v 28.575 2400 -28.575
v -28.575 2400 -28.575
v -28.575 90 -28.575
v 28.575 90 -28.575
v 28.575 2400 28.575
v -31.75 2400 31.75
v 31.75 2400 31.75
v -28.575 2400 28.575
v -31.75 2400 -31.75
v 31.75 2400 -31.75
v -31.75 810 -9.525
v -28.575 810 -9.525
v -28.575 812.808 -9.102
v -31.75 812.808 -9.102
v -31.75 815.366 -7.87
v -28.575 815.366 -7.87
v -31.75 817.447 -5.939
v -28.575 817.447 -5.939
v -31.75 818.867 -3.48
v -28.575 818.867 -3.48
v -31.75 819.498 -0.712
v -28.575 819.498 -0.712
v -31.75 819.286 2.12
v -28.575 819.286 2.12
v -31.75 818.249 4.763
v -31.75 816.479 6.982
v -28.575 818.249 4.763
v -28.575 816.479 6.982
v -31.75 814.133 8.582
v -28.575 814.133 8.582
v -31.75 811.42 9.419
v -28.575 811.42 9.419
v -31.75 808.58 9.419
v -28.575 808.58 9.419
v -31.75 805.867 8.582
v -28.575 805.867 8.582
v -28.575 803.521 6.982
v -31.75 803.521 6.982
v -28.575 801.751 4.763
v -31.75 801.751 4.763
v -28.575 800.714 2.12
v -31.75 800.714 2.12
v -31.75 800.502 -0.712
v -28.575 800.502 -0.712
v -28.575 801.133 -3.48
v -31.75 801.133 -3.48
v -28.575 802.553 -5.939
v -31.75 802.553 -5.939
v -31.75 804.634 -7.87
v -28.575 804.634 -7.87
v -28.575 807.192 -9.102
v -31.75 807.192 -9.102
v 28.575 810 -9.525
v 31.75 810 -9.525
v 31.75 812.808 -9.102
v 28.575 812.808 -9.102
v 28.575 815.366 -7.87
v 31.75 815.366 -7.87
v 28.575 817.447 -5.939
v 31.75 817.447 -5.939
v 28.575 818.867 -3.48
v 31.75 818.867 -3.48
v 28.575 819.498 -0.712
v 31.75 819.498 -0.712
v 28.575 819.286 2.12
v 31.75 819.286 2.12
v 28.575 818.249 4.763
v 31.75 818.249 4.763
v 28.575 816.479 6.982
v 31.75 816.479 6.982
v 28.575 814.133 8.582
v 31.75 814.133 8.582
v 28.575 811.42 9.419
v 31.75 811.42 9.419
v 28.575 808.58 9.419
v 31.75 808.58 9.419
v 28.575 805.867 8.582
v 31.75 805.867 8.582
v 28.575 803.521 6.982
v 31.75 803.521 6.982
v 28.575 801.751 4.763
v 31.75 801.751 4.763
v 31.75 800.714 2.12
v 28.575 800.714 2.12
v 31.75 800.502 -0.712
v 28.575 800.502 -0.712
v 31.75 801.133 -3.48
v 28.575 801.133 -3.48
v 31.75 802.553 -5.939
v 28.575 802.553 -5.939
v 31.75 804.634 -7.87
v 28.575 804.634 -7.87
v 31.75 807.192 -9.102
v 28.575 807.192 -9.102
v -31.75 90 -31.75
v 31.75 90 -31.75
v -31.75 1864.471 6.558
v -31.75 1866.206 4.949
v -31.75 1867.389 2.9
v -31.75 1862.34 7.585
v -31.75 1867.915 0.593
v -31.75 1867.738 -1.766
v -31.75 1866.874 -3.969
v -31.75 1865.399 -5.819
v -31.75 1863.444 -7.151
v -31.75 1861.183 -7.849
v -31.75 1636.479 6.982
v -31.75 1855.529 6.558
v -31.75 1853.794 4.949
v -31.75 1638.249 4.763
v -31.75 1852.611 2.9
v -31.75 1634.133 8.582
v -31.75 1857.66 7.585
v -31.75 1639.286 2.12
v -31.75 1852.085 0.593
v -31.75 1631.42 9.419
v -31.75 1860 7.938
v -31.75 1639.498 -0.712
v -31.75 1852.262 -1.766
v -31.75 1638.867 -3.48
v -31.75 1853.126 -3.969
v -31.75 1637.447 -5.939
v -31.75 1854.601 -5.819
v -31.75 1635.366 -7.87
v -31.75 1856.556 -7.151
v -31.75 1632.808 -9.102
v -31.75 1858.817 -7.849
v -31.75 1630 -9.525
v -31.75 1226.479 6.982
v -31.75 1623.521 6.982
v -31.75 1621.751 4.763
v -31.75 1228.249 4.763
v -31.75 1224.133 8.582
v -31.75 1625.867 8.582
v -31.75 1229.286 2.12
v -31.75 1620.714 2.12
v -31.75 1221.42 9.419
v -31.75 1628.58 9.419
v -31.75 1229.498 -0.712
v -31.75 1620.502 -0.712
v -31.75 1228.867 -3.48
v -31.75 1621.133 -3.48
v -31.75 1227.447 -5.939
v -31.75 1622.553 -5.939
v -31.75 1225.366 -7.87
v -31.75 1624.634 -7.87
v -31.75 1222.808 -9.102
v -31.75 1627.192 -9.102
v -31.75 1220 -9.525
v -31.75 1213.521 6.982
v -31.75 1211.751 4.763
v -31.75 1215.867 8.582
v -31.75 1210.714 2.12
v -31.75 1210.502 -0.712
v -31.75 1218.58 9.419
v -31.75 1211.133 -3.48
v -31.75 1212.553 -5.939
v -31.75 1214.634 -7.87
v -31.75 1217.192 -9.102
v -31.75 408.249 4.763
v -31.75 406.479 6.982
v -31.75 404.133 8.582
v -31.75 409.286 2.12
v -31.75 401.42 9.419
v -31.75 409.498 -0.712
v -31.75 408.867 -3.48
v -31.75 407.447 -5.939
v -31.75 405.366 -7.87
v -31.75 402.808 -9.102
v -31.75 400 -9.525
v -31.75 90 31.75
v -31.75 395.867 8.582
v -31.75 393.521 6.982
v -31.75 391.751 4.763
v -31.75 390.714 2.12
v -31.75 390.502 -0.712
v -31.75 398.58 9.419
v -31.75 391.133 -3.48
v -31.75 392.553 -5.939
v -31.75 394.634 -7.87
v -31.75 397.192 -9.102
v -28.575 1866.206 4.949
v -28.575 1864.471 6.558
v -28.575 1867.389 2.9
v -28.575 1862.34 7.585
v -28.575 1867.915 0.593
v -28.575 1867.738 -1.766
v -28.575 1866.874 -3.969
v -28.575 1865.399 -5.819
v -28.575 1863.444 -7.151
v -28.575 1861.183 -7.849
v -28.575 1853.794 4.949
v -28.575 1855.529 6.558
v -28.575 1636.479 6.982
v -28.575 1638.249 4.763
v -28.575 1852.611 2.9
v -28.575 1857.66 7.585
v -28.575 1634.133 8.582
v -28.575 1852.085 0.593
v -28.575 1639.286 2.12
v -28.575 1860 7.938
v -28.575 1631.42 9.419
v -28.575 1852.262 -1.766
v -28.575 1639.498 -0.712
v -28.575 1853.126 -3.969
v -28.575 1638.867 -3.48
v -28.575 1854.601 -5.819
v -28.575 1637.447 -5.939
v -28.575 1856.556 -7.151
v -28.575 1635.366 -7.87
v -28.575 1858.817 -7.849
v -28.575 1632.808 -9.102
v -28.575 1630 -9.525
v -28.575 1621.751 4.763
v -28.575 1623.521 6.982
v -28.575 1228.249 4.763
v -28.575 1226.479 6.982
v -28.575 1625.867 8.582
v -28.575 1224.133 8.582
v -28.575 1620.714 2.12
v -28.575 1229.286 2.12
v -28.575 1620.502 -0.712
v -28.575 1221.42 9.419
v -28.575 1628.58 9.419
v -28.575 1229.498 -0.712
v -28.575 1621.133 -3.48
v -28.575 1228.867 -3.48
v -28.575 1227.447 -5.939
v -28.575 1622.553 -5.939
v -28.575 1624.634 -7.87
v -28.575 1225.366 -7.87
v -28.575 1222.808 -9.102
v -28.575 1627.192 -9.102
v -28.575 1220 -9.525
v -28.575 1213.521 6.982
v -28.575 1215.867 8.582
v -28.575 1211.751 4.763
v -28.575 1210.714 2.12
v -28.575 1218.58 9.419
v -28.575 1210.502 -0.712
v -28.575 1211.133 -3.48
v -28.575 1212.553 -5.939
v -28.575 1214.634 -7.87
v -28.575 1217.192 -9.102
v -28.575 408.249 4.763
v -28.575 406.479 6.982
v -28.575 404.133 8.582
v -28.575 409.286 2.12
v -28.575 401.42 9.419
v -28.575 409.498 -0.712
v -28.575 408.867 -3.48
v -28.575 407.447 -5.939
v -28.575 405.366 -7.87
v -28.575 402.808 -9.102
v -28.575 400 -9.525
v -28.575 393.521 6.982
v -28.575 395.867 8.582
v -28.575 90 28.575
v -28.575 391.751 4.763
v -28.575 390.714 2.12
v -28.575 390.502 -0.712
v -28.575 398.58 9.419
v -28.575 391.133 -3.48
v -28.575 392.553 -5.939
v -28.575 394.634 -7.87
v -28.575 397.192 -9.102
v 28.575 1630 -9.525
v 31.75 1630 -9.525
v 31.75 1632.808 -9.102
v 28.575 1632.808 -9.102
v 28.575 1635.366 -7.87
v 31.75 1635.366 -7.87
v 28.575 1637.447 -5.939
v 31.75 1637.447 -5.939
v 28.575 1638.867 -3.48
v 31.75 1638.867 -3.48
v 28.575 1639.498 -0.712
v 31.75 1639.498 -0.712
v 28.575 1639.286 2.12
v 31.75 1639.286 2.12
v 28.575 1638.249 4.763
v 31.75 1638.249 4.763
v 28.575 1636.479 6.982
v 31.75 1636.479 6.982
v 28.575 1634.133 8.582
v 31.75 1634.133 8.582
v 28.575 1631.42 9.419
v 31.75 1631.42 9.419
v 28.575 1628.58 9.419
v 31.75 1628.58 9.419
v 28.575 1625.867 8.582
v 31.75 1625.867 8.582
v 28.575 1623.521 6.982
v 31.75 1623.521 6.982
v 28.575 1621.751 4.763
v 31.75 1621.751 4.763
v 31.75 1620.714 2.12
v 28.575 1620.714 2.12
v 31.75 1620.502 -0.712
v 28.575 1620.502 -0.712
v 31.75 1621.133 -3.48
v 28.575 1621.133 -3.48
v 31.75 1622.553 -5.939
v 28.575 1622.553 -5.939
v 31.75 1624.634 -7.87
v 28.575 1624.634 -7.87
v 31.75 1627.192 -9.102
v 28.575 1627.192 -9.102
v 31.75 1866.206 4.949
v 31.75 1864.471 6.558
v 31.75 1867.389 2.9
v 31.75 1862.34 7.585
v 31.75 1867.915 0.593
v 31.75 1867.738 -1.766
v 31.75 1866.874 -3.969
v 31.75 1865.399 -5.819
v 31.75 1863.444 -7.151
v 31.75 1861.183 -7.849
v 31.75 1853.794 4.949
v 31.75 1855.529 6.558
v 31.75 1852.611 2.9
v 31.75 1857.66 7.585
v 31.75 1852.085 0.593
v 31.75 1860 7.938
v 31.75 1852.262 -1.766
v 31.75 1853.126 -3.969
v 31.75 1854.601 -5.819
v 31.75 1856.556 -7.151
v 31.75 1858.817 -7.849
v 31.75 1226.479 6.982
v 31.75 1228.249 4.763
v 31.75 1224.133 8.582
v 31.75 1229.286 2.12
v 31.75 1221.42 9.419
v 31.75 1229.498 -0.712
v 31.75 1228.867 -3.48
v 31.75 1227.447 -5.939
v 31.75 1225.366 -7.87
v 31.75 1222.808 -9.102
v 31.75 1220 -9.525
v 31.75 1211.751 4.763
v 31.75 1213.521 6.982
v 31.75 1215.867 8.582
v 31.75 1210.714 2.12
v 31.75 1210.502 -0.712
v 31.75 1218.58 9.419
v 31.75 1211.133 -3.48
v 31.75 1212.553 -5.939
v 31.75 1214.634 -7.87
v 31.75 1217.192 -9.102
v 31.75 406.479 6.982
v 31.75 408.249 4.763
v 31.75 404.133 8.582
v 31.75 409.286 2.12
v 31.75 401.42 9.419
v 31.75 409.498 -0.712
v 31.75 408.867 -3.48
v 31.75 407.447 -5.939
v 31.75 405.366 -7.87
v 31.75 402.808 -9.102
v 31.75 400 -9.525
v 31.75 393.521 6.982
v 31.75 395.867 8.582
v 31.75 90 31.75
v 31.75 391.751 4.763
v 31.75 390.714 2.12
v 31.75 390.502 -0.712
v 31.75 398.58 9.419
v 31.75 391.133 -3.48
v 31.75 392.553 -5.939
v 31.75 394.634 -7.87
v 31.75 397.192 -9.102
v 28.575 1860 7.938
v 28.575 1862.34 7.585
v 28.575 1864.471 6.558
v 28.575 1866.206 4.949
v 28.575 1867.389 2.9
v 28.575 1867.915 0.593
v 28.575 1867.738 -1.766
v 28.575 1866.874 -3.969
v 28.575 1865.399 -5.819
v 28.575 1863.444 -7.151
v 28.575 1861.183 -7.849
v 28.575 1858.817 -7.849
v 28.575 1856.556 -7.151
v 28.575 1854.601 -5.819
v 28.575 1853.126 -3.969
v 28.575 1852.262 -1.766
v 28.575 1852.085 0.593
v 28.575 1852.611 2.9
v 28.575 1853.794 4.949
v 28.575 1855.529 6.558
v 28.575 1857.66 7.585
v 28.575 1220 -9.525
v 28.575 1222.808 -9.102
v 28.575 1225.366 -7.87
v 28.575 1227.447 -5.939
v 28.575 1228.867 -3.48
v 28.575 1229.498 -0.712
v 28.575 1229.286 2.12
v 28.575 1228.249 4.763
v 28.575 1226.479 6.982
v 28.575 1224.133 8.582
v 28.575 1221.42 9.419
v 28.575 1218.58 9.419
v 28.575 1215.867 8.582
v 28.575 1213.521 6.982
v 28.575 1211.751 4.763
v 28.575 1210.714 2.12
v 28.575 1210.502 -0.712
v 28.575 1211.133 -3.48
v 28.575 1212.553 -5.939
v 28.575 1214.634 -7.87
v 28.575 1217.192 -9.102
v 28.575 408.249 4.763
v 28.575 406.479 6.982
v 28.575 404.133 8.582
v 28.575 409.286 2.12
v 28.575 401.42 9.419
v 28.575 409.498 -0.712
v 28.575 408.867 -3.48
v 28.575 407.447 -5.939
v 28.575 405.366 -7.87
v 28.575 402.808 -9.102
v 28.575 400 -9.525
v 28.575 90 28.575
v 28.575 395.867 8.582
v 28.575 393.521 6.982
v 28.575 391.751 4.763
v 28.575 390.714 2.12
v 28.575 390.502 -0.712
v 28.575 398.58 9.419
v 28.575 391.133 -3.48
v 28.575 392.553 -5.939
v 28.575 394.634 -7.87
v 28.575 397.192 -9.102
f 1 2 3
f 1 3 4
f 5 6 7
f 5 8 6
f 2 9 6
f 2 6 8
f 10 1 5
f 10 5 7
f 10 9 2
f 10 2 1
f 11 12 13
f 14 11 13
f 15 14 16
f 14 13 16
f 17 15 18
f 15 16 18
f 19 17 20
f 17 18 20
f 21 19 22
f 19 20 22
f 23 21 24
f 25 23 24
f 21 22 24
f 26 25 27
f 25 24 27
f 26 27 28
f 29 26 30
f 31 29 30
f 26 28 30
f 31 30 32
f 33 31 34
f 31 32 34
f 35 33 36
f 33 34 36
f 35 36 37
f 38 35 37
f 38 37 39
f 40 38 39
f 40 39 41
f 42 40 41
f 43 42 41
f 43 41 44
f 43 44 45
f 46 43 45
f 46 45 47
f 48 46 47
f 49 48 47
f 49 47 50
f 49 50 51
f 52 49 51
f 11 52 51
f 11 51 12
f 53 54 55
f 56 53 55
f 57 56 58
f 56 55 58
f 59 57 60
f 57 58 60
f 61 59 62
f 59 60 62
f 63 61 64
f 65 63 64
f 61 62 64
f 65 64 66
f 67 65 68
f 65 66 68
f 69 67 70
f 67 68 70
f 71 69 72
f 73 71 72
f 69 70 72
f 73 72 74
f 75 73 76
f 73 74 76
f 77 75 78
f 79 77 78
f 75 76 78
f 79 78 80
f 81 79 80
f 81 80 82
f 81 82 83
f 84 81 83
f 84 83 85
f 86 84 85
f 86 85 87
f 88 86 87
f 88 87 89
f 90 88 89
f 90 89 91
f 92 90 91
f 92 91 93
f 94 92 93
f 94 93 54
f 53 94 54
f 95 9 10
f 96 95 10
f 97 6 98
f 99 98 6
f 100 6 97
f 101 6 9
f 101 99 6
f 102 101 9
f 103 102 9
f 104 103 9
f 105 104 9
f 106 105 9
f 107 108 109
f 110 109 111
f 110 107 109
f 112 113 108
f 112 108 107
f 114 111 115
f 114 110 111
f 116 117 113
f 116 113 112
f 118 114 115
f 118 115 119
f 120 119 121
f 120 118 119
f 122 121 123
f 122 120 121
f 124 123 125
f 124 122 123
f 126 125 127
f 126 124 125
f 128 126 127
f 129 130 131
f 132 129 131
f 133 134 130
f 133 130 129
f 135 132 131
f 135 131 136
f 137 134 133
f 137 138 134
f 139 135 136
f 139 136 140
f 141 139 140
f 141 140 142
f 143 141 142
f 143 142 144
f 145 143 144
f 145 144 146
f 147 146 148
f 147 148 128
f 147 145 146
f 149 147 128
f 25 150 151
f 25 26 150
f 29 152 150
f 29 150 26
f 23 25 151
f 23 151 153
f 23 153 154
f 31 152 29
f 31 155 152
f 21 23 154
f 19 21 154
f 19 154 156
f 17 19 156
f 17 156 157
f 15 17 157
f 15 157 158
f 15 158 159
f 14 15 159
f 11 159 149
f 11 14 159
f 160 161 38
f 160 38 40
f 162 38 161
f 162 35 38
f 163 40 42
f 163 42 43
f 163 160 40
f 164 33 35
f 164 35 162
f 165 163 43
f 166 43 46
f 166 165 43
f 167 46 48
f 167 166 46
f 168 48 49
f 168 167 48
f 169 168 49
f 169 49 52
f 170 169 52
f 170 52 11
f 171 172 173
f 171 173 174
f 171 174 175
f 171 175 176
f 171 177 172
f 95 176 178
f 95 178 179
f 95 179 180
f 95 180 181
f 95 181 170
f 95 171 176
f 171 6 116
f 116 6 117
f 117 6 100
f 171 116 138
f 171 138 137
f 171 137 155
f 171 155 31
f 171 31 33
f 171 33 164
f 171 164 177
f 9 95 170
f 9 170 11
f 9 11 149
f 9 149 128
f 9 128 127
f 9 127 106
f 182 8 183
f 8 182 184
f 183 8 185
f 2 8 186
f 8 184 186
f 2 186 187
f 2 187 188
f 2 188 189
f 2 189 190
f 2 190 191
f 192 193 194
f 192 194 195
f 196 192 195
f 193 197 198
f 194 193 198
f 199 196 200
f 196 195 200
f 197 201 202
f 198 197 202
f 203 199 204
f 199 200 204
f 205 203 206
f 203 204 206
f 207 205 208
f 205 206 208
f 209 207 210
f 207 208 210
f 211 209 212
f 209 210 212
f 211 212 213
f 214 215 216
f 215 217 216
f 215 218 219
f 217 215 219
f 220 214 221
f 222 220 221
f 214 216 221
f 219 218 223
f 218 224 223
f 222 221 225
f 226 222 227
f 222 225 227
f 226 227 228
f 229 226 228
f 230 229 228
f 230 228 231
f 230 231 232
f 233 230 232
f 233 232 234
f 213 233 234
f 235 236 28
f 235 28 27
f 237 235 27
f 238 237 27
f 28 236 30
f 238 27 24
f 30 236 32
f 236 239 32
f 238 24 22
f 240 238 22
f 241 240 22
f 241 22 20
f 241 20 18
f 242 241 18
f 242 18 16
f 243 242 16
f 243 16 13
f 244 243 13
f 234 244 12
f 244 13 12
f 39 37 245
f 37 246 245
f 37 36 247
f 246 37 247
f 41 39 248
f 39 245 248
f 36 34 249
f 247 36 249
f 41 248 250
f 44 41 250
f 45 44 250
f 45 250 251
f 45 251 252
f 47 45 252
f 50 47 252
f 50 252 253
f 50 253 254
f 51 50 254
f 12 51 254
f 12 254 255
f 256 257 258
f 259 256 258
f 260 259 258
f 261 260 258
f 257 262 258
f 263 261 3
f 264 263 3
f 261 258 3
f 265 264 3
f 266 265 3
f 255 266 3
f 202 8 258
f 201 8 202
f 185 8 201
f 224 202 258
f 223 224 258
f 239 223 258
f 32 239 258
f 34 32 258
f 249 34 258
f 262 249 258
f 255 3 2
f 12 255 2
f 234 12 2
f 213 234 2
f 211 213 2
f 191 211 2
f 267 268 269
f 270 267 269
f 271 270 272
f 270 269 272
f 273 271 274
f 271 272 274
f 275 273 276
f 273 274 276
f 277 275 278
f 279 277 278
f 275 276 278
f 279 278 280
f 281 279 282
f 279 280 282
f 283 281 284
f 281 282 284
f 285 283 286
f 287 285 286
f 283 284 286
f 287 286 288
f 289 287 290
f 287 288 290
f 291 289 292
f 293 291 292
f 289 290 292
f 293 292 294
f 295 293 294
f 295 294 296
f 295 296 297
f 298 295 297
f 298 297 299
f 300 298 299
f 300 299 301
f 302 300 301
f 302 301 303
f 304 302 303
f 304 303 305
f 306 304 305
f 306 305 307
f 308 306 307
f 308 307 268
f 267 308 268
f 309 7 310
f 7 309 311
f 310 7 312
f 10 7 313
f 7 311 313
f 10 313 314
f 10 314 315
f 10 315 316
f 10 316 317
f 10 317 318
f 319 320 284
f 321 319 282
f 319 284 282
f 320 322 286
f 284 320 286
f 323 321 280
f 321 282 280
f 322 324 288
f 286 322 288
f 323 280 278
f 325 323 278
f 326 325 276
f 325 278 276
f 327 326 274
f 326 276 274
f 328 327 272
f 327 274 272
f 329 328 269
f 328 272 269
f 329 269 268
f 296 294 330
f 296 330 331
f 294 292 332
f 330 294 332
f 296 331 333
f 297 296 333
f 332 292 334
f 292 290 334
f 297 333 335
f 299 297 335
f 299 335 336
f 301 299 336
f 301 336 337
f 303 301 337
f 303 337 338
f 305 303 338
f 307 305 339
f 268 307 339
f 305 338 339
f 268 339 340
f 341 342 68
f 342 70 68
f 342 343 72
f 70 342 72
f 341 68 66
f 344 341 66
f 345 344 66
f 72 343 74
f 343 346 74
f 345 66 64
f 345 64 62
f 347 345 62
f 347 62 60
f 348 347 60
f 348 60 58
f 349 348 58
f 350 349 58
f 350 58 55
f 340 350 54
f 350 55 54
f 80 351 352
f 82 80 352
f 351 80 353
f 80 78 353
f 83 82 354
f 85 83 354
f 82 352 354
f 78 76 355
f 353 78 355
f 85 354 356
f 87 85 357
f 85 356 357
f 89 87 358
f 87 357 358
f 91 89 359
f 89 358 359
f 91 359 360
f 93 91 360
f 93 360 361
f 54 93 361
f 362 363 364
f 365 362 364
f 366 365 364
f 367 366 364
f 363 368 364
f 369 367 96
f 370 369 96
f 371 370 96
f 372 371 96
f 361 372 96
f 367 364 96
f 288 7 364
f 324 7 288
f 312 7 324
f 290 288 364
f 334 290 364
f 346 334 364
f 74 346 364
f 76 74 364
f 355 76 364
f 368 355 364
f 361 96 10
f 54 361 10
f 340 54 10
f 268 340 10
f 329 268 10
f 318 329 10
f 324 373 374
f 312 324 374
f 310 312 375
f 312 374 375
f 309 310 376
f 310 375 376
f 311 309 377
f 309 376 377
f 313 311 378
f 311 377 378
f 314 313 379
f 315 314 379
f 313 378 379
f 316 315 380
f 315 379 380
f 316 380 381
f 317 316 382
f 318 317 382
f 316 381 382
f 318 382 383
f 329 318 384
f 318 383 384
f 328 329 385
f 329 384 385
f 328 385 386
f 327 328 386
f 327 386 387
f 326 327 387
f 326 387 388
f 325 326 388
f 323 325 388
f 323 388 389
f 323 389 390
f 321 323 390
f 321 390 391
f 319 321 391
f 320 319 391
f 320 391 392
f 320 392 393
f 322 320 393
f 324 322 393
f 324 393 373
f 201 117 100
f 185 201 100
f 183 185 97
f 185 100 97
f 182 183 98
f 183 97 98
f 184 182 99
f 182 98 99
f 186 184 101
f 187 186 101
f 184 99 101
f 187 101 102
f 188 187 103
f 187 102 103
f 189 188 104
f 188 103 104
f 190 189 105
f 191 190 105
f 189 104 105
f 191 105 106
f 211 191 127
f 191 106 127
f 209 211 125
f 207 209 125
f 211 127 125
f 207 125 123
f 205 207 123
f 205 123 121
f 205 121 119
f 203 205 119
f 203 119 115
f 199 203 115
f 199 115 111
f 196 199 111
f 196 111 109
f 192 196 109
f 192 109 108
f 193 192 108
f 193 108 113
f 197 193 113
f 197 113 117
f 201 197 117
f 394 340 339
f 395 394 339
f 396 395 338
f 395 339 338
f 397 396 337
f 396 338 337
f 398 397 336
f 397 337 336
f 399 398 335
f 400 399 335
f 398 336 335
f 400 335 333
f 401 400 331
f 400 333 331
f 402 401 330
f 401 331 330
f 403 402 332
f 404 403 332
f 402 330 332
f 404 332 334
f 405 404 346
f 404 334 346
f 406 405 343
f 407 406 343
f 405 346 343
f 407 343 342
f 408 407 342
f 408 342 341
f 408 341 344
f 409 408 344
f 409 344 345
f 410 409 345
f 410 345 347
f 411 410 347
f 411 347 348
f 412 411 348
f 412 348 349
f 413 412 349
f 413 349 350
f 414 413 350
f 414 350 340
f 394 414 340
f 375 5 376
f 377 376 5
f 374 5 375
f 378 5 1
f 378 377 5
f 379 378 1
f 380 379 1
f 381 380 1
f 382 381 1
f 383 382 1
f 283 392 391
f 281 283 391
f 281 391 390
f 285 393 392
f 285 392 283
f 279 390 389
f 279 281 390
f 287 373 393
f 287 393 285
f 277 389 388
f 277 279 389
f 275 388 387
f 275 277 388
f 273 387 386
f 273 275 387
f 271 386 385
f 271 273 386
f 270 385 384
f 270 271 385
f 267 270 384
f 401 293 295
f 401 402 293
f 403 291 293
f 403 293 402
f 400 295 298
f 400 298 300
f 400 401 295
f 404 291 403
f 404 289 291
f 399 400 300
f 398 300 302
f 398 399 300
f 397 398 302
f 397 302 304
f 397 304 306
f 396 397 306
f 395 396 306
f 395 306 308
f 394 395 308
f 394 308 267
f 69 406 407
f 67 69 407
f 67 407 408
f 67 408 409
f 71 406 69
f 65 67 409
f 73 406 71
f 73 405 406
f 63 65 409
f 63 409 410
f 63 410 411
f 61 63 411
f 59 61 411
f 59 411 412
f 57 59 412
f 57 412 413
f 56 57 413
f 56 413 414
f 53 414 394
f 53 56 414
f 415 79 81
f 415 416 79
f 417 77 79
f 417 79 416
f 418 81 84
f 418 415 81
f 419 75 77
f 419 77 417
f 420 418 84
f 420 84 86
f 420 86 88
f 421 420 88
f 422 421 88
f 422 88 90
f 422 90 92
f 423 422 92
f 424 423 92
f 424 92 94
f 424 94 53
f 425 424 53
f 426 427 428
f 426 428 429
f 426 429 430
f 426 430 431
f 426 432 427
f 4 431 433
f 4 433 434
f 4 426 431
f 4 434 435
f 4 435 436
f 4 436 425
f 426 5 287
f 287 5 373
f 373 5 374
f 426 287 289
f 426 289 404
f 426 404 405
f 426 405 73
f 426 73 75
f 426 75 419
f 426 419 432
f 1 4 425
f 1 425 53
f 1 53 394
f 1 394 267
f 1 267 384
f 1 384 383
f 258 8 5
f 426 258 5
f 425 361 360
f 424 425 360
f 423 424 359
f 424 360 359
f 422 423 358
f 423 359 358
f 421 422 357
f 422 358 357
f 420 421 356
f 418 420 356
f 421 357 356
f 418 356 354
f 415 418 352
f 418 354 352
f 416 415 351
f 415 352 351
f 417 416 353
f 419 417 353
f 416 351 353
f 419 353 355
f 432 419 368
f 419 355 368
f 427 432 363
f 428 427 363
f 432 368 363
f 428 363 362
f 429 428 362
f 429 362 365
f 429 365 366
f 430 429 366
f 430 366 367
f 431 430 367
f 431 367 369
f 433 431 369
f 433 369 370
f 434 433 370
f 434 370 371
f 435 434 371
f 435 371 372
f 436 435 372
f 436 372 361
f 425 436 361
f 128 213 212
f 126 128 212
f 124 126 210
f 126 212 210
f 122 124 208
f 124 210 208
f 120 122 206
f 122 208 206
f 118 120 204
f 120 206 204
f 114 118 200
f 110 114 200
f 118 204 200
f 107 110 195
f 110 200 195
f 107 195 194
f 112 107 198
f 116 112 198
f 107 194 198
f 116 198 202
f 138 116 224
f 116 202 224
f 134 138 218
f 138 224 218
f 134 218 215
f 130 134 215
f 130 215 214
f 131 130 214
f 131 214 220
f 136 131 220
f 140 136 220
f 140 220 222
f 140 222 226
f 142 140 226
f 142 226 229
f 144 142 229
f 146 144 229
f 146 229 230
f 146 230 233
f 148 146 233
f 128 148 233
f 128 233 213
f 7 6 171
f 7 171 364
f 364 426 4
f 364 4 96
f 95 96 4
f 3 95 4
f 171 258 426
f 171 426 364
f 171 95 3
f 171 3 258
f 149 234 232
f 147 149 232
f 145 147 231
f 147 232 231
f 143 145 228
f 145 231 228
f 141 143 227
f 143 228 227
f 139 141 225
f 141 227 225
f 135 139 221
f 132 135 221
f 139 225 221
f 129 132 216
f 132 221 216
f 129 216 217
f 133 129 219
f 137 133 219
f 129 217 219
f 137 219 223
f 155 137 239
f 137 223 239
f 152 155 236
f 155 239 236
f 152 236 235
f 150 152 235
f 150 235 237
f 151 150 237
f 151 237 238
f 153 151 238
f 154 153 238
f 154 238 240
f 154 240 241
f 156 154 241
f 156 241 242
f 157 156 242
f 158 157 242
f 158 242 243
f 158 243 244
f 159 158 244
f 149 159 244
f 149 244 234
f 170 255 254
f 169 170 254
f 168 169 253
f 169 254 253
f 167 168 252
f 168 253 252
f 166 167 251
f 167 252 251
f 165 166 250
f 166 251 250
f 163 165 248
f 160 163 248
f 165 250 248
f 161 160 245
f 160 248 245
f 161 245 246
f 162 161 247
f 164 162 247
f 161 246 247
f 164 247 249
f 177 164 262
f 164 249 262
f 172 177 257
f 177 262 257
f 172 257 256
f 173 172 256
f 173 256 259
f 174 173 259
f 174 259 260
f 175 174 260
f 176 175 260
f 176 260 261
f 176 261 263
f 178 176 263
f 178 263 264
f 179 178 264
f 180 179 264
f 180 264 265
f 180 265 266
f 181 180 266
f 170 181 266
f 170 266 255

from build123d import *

# Parameters (mm, degrees)
CROQUIS1_W              = 63.5
CROQUIS1_H              = 63.5
CROQUIS1_W_2            = 57.15
CROQUIS1_H_2            = 57.15
SALIENTE_EXTRUIR1_DEPTH = 2400
CROQUIS2_R              = 9.525
CORTAR_EXTRUIR1_DEPTH   = 450
MATRIZL1_COUNT          = 4
MATRIZL1_PITCH          = 410
CROQUIS3_W              = 63.5
CROQUIS3_H              = 90
CORTAR_EXTRUIR2_DEPTH   = 200
CROQUIS4_R              = 7.9375
CORTAR_EXTRUIR3_DEPTH   = 63.5


with BuildPart() as part:
    # Croquis1 → Saliente-Extruir1 (new body)
    with BuildSketch(Plane(origin=(0, 0, 0), x_dir=(1, 0, 0), z_dir=(0, 1, 0))):
        Rectangle(CROQUIS1_W, CROQUIS1_H)
        Rectangle(CROQUIS1_W_2, CROQUIS1_H_2, mode=Mode.SUBTRACT)
    extrude(amount=SALIENTE_EXTRUIR1_DEPTH)

    # Croquis2 → Cortar-Extruir1 (cut)
    with BuildSketch(Plane(origin=(31.75, 0, 0), x_dir=(0, 0, -1), z_dir=(1, 0, 0))):
        with Locations((0, 400)):
            Circle(CROQUIS2_R)
    cortar_extruir1 = extrude(amount=-CORTAR_EXTRUIR1_DEPTH, mode=Mode.SUBTRACT)

    # MatrizL1: Cortar-Extruir1 ×4
    with Locations(*[(0, i * MATRIZL1_PITCH, 0) for i in range(1, MATRIZL1_COUNT)]):
        add(cortar_extruir1, mode=Mode.SUBTRACT)

    # Croquis3 → Cortar-Extruir2 (cut)
    with BuildSketch(Plane.ZY.offset(31.75)):
        with Locations((0, 45)):
            Rectangle(CROQUIS3_W, CROQUIS3_H)
    extrude(amount=-CORTAR_EXTRUIR2_DEPTH, mode=Mode.SUBTRACT)

    # Croquis4 → Cortar-Extruir3 (cut)
    with BuildSketch(Plane.ZY.offset(31.75)):
        with Locations((0, 1860)):
            Circle(CROQUIS4_R)
    extrude(amount=-CORTAR_EXTRUIR3_DEPTH, mode=Mode.SUBTRACT)


solid = part.part
